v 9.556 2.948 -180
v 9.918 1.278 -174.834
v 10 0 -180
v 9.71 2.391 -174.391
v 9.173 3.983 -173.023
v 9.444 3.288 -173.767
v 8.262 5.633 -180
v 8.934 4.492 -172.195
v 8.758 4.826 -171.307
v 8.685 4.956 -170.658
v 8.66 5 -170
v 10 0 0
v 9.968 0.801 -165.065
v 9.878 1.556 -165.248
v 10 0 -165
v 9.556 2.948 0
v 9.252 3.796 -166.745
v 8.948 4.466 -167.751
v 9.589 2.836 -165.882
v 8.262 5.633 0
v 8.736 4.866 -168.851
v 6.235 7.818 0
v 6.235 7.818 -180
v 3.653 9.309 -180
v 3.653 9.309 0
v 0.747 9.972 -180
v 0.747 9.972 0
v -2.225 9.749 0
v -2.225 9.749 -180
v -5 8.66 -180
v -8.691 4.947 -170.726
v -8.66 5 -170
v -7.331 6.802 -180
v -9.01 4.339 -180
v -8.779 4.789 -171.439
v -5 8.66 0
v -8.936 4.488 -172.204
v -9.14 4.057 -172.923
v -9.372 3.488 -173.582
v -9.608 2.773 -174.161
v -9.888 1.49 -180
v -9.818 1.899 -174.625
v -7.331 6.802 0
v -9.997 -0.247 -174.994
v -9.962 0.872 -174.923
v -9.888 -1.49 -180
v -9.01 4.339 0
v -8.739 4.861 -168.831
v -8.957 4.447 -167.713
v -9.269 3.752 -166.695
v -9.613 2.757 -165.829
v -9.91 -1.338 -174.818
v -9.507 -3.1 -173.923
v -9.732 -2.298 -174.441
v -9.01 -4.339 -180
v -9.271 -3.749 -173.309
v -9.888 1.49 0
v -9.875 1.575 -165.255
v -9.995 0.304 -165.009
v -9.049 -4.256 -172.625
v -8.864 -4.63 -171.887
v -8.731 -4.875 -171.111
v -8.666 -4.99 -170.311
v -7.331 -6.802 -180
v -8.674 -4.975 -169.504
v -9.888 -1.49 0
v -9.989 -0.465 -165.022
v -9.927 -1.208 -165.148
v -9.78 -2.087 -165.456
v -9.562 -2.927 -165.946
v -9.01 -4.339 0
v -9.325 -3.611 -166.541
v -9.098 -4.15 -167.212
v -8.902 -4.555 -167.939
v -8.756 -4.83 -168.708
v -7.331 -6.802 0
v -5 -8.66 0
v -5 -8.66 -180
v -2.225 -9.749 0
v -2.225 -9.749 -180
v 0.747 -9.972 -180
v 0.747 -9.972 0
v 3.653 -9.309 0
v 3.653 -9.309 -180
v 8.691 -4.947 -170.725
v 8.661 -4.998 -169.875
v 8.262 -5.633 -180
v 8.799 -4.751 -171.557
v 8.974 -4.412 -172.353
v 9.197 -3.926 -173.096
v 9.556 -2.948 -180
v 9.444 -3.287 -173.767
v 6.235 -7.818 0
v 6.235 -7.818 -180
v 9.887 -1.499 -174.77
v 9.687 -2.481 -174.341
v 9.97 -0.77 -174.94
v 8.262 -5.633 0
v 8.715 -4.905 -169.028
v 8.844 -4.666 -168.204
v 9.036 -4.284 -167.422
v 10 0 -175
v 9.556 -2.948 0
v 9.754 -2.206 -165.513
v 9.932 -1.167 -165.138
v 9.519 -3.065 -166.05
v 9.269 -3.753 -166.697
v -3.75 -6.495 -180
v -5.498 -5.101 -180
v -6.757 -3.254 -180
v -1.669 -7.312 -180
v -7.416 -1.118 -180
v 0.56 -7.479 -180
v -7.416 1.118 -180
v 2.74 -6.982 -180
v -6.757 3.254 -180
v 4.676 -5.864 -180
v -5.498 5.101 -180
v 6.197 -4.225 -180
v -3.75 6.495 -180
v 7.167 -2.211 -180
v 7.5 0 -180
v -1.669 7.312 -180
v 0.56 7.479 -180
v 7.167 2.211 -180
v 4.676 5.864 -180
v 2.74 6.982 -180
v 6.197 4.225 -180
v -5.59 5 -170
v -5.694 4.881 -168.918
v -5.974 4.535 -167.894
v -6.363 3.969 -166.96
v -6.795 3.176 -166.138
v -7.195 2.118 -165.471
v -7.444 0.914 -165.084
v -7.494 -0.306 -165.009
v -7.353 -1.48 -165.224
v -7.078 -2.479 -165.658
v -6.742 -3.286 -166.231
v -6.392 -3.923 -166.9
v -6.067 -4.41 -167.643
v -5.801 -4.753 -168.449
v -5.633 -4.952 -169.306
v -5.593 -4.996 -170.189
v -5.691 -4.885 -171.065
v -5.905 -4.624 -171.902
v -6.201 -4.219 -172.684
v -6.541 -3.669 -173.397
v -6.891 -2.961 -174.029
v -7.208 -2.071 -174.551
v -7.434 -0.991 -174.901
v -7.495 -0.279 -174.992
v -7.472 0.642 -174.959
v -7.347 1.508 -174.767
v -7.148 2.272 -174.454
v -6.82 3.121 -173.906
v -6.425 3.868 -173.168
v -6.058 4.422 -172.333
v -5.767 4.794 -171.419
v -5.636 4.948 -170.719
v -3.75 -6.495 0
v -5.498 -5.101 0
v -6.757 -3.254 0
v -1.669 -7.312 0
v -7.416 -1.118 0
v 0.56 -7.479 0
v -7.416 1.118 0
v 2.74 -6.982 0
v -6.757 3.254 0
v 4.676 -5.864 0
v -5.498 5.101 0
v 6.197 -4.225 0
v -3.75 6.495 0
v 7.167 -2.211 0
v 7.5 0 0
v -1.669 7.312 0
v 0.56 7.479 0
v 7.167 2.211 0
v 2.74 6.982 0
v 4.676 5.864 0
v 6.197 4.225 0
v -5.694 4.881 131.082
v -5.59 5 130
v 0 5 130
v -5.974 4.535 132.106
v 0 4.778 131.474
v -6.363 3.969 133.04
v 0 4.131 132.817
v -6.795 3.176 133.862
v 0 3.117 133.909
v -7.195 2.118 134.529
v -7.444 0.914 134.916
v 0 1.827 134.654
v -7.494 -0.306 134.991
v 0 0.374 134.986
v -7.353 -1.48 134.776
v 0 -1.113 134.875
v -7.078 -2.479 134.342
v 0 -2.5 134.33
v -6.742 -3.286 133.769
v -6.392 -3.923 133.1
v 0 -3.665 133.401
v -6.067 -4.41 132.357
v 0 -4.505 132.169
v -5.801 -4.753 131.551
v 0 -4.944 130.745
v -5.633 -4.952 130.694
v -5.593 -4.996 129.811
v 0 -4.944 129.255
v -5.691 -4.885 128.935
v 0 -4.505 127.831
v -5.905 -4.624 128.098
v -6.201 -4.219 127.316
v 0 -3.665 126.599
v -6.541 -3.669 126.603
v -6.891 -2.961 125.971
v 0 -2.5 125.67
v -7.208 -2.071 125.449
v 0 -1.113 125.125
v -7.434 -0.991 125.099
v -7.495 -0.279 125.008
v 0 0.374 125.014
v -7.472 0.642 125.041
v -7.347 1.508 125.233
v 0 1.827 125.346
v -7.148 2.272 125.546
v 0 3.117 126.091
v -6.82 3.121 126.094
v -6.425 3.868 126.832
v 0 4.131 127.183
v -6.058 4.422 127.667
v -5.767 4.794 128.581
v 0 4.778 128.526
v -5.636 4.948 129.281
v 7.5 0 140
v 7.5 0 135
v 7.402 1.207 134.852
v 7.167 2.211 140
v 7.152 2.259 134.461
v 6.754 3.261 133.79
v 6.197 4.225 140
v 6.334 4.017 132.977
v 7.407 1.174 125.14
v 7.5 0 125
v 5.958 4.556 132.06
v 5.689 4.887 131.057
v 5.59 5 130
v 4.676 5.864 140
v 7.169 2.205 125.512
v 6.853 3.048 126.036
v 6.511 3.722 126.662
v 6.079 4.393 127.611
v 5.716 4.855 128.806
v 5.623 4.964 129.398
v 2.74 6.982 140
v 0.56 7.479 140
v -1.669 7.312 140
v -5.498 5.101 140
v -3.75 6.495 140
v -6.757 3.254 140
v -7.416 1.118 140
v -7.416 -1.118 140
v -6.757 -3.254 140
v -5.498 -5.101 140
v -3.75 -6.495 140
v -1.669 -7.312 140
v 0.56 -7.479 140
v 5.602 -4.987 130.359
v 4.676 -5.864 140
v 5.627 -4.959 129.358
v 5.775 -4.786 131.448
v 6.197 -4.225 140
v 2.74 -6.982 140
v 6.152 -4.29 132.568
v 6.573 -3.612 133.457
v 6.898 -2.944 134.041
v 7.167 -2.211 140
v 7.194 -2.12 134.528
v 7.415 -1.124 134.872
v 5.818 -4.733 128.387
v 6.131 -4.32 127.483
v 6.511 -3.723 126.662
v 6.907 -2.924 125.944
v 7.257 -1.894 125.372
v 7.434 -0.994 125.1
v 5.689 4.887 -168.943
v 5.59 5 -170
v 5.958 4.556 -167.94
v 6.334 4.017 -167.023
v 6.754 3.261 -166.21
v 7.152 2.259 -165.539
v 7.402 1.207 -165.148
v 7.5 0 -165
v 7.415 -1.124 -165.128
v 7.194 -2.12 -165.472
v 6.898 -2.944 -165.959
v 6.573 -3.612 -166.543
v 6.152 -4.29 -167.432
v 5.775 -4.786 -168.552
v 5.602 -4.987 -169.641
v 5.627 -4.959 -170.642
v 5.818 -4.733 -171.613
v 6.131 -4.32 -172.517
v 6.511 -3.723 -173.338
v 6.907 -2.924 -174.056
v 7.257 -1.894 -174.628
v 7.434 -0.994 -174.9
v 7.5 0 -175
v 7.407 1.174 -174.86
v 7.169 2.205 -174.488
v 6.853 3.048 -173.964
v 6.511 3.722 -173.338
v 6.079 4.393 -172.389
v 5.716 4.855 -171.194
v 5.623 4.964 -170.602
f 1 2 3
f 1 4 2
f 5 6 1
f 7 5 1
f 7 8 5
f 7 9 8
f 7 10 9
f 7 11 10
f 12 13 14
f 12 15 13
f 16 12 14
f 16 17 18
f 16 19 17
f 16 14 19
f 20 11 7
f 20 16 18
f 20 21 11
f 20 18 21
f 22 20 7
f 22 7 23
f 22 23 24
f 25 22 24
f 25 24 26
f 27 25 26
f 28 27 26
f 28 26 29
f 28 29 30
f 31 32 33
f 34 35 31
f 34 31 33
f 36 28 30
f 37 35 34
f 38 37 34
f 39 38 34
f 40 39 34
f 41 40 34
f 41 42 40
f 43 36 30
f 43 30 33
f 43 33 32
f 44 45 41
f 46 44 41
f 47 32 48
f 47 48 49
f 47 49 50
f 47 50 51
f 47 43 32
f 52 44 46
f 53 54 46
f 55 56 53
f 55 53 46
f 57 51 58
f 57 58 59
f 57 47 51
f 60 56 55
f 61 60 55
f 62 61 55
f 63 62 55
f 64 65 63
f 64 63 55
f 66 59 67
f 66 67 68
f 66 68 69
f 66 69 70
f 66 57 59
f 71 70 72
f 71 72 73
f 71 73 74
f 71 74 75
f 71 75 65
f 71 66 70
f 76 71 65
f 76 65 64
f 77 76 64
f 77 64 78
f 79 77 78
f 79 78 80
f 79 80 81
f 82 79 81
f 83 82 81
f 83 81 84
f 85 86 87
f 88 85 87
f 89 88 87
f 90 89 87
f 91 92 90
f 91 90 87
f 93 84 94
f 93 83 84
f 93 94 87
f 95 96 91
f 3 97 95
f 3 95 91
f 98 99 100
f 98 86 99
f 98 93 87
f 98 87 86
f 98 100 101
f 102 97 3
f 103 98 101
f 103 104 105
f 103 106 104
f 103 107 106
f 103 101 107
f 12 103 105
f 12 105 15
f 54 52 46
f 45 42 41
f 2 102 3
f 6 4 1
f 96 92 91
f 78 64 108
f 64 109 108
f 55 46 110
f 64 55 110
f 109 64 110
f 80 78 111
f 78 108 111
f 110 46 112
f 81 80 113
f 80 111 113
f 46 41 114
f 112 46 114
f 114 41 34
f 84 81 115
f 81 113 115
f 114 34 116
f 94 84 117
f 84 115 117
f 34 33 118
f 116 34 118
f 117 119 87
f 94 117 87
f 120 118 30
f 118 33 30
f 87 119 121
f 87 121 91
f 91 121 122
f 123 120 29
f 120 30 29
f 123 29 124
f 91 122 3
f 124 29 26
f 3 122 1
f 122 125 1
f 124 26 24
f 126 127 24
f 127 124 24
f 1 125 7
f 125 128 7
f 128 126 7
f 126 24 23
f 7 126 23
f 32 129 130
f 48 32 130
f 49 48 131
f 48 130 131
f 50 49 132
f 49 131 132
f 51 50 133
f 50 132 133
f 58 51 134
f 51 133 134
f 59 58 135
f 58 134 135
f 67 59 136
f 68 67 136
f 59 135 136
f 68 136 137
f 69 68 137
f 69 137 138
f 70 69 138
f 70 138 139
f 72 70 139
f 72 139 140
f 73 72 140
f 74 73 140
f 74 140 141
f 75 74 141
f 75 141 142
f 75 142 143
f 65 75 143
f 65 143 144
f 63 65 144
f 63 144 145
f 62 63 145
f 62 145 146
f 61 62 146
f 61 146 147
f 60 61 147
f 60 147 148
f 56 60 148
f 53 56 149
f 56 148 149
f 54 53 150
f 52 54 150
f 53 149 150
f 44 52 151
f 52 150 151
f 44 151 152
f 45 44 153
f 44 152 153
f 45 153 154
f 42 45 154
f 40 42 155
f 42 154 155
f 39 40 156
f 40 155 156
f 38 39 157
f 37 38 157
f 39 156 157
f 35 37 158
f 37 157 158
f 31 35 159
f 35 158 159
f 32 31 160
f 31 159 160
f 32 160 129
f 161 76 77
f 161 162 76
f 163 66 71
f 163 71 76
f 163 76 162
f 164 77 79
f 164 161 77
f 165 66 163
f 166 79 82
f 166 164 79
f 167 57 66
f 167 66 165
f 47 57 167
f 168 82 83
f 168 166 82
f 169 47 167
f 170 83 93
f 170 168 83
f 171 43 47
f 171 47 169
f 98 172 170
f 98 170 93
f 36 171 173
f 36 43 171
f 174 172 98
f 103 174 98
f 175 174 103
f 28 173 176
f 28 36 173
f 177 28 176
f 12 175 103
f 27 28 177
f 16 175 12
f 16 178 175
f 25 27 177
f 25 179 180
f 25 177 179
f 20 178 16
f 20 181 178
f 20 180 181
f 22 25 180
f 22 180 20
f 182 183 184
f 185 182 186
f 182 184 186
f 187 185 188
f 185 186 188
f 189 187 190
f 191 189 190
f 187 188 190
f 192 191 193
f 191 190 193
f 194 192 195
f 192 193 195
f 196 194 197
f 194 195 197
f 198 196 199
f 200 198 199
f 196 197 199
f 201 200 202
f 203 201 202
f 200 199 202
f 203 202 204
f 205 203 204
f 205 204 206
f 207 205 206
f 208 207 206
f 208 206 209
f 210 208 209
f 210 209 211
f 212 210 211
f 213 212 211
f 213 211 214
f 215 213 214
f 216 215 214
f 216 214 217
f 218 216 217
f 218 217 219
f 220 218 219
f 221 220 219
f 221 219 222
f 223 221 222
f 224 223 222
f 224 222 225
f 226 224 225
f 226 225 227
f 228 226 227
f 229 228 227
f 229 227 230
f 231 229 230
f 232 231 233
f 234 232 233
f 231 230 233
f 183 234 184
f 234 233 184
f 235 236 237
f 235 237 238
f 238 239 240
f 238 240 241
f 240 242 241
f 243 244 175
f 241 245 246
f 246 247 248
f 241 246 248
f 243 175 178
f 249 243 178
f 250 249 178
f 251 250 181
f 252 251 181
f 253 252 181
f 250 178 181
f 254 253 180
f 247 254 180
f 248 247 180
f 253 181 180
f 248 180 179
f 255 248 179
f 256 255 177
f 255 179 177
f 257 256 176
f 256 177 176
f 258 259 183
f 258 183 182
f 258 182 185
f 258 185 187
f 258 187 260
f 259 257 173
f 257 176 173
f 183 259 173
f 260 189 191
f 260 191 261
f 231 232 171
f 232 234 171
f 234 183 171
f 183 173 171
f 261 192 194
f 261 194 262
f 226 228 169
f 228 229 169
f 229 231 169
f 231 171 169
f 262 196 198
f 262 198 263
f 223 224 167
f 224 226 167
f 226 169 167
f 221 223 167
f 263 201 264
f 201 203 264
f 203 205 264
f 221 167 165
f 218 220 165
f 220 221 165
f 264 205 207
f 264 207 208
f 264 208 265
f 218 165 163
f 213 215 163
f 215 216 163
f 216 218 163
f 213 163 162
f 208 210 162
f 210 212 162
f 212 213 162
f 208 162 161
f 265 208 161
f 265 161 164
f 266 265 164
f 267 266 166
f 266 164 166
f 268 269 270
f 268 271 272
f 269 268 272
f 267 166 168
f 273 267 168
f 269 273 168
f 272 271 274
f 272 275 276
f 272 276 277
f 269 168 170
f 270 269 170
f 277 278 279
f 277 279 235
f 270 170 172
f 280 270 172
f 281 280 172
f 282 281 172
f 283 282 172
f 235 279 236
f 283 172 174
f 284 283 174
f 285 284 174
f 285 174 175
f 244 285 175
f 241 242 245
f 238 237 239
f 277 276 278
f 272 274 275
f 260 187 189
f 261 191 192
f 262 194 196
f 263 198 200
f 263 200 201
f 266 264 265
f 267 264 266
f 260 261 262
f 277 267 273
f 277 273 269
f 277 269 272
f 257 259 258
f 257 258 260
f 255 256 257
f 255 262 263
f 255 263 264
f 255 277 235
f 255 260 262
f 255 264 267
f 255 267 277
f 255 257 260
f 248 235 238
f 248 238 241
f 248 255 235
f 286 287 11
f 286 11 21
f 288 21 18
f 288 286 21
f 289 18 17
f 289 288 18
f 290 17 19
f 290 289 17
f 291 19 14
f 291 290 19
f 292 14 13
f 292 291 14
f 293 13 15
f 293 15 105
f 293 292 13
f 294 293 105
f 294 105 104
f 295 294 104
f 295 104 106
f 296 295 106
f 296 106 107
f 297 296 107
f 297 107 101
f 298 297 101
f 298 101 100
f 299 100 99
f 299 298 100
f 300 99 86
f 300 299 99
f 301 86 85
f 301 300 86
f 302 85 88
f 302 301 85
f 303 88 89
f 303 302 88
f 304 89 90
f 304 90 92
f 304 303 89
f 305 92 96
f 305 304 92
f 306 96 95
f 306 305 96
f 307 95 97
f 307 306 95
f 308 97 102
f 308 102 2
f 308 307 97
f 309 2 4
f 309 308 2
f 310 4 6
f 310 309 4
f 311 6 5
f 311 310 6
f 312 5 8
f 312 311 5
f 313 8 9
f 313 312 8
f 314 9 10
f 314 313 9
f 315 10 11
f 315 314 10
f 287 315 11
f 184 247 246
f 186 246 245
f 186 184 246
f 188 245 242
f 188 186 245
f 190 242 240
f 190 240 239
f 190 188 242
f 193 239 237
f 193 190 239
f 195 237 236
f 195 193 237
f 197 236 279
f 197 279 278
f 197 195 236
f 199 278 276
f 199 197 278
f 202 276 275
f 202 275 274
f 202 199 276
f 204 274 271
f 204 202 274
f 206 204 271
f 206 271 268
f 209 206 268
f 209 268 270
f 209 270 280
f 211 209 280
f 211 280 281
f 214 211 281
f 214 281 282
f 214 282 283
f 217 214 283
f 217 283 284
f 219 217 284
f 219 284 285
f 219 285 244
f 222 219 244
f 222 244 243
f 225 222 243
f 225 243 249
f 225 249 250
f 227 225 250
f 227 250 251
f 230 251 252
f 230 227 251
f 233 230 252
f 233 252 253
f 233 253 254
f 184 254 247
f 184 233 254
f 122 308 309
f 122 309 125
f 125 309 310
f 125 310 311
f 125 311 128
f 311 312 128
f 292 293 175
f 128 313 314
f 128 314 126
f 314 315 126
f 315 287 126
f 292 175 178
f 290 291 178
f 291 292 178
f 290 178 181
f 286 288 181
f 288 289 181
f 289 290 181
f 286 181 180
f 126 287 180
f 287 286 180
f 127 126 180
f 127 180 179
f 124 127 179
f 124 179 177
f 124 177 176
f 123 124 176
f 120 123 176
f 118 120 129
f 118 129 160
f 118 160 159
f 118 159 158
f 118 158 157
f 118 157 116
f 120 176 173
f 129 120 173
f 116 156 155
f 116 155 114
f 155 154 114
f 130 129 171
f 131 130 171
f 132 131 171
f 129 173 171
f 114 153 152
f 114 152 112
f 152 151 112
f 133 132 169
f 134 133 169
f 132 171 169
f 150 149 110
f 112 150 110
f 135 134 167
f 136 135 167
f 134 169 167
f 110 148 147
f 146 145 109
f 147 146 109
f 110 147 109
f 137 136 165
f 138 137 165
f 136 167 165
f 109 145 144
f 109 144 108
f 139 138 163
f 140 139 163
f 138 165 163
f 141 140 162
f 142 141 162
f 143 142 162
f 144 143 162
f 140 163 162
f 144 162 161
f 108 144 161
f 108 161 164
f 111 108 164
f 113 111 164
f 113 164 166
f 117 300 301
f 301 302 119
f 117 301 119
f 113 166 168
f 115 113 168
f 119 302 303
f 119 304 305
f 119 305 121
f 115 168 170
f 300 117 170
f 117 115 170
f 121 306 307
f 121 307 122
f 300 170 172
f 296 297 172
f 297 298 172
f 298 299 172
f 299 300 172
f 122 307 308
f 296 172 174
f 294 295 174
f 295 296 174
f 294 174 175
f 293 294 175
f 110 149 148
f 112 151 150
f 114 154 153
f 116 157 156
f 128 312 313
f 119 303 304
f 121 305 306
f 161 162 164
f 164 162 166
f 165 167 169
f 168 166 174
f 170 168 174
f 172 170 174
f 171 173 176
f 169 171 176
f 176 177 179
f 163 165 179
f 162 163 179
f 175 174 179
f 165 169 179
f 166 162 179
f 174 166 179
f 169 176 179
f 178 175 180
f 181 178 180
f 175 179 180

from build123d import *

# Parameters (mm, degrees)
F0_R          = 7.5
F1_DEPTH      = 140
F2_R          = 5
F3_DEPTH      = 7.5
F3_DEPTH_BACK = 7.5
F4_R          = 10
F4_R_2        = 7.5
F5_DEPTH      = 180
F6_R          = 5
F7_DEPTH      = 20
F7_DEPTH_BACK = 20


with BuildPart() as f1:
    # F0 (on Top) → F1 (new body)
    with BuildSketch(Plane.XY):
        Circle(F0_R)
    extrude(amount=F1_DEPTH)

    # F2 (on Right) → F3 (cut, two sides)
    with BuildSketch(Plane.YZ) as f3_sk:
        with Locations((0, 130)):
            Circle(F2_R)
    extrude(amount=F3_DEPTH, mode=Mode.SUBTRACT)
    extrude(f3_sk.sketch, amount=-F3_DEPTH_BACK, mode=Mode.SUBTRACT)


with BuildPart() as f5:
    # F4 (on Top) → F5 (new body)
    with BuildSketch(Plane.XY):
        Circle(F4_R)
        Circle(F4_R_2, mode=Mode.SUBTRACT)
    extrude(amount=-F5_DEPTH)

    # F6 (on Right) → F7 (cut, two sides)
    with BuildSketch(Plane.YZ) as f7_sk:
        with Locations((0, -170)):
            Circle(F6_R)
    extrude(amount=F7_DEPTH, mode=Mode.SUBTRACT)
    extrude(f7_sk.sketch, amount=-F7_DEPTH_BACK, mode=Mode.SUBTRACT)


solid = Compound([f1.part, f5.part])
